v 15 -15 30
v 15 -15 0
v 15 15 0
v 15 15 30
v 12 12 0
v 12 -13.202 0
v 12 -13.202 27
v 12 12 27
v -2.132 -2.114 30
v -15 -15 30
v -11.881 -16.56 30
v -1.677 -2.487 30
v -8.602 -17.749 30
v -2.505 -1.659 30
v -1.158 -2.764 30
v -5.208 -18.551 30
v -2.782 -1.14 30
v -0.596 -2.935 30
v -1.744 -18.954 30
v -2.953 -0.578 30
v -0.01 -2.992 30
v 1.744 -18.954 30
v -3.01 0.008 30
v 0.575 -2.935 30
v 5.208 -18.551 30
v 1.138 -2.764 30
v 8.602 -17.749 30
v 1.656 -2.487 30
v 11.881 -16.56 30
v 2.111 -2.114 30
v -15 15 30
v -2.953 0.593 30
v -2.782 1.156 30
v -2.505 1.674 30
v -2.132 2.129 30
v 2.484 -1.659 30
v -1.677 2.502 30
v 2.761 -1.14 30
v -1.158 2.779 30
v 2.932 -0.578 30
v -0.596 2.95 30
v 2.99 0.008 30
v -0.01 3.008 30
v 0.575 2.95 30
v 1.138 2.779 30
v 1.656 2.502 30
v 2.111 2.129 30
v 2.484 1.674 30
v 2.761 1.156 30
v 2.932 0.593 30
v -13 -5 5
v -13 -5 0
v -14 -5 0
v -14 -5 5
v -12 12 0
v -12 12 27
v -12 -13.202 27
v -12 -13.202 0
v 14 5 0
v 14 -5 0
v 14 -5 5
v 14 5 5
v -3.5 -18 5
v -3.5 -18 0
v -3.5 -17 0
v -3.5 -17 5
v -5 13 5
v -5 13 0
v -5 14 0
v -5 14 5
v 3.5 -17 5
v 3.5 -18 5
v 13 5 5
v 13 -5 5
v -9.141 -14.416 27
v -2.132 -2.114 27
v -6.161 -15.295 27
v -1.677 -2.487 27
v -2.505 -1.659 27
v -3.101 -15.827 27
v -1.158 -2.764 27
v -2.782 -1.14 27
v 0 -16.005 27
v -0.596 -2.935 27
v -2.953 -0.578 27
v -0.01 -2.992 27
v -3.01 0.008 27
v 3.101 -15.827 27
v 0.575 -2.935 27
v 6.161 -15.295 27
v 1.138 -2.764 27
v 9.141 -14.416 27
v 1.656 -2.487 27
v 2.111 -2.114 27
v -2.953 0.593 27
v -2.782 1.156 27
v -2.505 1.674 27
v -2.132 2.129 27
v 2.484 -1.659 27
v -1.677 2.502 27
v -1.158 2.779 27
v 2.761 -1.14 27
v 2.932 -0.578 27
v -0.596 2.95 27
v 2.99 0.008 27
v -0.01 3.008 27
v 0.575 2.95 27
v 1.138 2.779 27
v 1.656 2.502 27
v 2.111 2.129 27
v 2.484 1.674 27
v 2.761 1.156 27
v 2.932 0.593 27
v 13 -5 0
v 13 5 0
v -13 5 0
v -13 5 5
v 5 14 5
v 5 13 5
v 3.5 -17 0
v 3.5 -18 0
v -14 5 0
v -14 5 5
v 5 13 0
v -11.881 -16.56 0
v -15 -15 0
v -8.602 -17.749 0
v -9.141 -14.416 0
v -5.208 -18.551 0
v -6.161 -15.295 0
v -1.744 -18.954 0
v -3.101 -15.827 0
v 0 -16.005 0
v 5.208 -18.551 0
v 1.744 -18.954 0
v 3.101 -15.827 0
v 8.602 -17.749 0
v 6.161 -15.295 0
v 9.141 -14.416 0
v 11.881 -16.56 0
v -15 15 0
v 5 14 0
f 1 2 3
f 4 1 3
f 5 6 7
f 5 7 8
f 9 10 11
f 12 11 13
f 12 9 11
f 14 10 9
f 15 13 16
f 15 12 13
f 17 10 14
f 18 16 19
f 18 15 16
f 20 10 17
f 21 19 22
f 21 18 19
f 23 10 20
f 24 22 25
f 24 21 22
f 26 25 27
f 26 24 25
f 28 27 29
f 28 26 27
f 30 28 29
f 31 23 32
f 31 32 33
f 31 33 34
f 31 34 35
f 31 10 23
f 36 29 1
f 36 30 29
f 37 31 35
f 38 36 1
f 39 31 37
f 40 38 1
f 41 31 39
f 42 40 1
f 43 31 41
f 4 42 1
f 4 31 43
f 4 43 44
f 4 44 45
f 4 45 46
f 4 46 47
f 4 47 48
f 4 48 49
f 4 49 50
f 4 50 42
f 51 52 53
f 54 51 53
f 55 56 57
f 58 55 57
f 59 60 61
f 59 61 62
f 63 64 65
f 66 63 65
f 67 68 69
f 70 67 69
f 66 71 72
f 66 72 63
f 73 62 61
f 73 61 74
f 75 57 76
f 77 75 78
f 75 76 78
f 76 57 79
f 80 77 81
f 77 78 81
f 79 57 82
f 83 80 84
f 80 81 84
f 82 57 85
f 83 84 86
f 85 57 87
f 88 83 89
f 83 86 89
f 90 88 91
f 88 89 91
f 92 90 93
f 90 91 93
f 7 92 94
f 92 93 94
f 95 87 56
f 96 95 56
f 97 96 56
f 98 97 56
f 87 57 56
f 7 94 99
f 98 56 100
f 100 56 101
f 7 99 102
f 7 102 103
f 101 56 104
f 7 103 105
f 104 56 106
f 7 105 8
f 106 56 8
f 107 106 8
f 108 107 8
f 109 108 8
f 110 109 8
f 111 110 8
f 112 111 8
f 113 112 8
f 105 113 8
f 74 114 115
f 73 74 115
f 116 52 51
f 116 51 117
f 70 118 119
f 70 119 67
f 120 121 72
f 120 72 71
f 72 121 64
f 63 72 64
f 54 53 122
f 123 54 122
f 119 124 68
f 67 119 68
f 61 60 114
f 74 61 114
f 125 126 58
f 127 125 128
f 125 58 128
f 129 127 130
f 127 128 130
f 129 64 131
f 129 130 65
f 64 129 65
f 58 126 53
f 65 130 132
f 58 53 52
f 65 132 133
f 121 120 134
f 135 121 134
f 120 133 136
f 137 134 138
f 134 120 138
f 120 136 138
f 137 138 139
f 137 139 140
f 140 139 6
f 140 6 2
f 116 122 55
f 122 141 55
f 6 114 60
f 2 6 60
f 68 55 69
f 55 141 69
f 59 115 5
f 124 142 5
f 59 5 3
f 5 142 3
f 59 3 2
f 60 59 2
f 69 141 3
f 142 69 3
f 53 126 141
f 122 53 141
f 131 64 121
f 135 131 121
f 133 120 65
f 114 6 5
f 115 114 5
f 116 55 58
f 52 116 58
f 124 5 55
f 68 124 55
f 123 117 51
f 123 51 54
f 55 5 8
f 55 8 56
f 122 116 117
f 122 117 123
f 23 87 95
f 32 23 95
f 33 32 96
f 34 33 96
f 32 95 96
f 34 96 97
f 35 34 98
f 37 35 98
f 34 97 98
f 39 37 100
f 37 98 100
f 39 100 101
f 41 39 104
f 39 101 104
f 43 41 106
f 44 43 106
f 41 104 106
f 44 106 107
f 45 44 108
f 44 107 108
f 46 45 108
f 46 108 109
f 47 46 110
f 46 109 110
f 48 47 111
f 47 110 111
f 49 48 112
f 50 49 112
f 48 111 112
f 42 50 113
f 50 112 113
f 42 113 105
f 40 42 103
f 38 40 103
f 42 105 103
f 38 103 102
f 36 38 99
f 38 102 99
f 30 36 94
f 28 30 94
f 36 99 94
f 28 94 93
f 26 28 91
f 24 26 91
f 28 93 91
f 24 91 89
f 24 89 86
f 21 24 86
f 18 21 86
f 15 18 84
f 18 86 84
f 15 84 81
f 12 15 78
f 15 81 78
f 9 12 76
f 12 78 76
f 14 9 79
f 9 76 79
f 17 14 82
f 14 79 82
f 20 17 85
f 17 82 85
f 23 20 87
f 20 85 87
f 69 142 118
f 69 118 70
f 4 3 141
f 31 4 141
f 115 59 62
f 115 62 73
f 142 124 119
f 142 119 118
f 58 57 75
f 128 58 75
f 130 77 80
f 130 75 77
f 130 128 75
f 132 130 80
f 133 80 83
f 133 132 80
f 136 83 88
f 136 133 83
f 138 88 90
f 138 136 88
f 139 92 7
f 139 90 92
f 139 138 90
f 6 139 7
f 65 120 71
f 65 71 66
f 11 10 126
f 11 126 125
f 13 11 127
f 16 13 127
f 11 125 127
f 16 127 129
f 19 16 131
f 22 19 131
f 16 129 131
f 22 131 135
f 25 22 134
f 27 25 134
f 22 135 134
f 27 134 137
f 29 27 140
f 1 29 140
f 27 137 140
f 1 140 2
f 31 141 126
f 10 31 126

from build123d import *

# Parameters (mm, degrees)
BOSS_EXTRUDE1_DEPTH = 30
SHELL13_T           = -3
SKETCH3_R           = 3
CUT_EXTRUDE2_DEPTH  = 3
SKETCH4_W           = 10
SKETCH4_H           = 1
SKETCH4_W_2         = 1
SKETCH4_H_2         = 10
SKETCH4_W_3         = 7
CUT_EXTRUDE3_DEPTH  = 5


with BuildPart() as part:
    # Sketch1 → Boss-Extrude1 (new body)
    with BuildSketch(Plane.XY):
        with BuildLine():
            Line((15, -15), (15, 15))
            Line((15, 15), (-15, 15))
            Line((-15, 15), (-15, -15))
            ThreePointArc((-15, -15), (0, -19.004680178), (15, -15))
        make_face()
    extrude(amount=BOSS_EXTRUDE1_DEPTH)

    # Shell13
    shell13_openings = [part.faces().sort_by_distance(p)[0] for p in [
        (0, -1.375060702, 0),
    ]]
    offset(amount=SHELL13_T, openings=shell13_openings, kind=Kind.INTERSECTION)

    # Sketch3 → Cut-Extrude2 (cut)
    with BuildSketch(Plane(origin=(0, 0, 27), x_dir=(-1, 0, 0), z_dir=(0, 0, -1))):
        with Locations((0.010259738, 0.007572697)):
            Circle(SKETCH3_R)
    extrude(amount=-CUT_EXTRUDE2_DEPTH, mode=Mode.SUBTRACT)

    # Sketch4 → Cut-Extrude3 (cut)
    with BuildSketch(Plane(origin=(0, 0, 0), x_dir=(-1, 0, 0), z_dir=(0, 0, -1))):
        with Locations((0, 13.5)):
            Rectangle(SKETCH4_W, SKETCH4_H)
        with Locations((-13.5, 0)):
            Rectangle(SKETCH4_W_2, SKETCH4_H_2)
        with Locations((0, -17.5)):
            Rectangle(SKETCH4_W_3, SKETCH4_H)
        with Locations((13.5, 0)):
            Rectangle(SKETCH4_W_2, SKETCH4_H_2)
    extrude(amount=-CUT_EXTRUDE3_DEPTH, mode=Mode.SUBTRACT)


solid = part.part
